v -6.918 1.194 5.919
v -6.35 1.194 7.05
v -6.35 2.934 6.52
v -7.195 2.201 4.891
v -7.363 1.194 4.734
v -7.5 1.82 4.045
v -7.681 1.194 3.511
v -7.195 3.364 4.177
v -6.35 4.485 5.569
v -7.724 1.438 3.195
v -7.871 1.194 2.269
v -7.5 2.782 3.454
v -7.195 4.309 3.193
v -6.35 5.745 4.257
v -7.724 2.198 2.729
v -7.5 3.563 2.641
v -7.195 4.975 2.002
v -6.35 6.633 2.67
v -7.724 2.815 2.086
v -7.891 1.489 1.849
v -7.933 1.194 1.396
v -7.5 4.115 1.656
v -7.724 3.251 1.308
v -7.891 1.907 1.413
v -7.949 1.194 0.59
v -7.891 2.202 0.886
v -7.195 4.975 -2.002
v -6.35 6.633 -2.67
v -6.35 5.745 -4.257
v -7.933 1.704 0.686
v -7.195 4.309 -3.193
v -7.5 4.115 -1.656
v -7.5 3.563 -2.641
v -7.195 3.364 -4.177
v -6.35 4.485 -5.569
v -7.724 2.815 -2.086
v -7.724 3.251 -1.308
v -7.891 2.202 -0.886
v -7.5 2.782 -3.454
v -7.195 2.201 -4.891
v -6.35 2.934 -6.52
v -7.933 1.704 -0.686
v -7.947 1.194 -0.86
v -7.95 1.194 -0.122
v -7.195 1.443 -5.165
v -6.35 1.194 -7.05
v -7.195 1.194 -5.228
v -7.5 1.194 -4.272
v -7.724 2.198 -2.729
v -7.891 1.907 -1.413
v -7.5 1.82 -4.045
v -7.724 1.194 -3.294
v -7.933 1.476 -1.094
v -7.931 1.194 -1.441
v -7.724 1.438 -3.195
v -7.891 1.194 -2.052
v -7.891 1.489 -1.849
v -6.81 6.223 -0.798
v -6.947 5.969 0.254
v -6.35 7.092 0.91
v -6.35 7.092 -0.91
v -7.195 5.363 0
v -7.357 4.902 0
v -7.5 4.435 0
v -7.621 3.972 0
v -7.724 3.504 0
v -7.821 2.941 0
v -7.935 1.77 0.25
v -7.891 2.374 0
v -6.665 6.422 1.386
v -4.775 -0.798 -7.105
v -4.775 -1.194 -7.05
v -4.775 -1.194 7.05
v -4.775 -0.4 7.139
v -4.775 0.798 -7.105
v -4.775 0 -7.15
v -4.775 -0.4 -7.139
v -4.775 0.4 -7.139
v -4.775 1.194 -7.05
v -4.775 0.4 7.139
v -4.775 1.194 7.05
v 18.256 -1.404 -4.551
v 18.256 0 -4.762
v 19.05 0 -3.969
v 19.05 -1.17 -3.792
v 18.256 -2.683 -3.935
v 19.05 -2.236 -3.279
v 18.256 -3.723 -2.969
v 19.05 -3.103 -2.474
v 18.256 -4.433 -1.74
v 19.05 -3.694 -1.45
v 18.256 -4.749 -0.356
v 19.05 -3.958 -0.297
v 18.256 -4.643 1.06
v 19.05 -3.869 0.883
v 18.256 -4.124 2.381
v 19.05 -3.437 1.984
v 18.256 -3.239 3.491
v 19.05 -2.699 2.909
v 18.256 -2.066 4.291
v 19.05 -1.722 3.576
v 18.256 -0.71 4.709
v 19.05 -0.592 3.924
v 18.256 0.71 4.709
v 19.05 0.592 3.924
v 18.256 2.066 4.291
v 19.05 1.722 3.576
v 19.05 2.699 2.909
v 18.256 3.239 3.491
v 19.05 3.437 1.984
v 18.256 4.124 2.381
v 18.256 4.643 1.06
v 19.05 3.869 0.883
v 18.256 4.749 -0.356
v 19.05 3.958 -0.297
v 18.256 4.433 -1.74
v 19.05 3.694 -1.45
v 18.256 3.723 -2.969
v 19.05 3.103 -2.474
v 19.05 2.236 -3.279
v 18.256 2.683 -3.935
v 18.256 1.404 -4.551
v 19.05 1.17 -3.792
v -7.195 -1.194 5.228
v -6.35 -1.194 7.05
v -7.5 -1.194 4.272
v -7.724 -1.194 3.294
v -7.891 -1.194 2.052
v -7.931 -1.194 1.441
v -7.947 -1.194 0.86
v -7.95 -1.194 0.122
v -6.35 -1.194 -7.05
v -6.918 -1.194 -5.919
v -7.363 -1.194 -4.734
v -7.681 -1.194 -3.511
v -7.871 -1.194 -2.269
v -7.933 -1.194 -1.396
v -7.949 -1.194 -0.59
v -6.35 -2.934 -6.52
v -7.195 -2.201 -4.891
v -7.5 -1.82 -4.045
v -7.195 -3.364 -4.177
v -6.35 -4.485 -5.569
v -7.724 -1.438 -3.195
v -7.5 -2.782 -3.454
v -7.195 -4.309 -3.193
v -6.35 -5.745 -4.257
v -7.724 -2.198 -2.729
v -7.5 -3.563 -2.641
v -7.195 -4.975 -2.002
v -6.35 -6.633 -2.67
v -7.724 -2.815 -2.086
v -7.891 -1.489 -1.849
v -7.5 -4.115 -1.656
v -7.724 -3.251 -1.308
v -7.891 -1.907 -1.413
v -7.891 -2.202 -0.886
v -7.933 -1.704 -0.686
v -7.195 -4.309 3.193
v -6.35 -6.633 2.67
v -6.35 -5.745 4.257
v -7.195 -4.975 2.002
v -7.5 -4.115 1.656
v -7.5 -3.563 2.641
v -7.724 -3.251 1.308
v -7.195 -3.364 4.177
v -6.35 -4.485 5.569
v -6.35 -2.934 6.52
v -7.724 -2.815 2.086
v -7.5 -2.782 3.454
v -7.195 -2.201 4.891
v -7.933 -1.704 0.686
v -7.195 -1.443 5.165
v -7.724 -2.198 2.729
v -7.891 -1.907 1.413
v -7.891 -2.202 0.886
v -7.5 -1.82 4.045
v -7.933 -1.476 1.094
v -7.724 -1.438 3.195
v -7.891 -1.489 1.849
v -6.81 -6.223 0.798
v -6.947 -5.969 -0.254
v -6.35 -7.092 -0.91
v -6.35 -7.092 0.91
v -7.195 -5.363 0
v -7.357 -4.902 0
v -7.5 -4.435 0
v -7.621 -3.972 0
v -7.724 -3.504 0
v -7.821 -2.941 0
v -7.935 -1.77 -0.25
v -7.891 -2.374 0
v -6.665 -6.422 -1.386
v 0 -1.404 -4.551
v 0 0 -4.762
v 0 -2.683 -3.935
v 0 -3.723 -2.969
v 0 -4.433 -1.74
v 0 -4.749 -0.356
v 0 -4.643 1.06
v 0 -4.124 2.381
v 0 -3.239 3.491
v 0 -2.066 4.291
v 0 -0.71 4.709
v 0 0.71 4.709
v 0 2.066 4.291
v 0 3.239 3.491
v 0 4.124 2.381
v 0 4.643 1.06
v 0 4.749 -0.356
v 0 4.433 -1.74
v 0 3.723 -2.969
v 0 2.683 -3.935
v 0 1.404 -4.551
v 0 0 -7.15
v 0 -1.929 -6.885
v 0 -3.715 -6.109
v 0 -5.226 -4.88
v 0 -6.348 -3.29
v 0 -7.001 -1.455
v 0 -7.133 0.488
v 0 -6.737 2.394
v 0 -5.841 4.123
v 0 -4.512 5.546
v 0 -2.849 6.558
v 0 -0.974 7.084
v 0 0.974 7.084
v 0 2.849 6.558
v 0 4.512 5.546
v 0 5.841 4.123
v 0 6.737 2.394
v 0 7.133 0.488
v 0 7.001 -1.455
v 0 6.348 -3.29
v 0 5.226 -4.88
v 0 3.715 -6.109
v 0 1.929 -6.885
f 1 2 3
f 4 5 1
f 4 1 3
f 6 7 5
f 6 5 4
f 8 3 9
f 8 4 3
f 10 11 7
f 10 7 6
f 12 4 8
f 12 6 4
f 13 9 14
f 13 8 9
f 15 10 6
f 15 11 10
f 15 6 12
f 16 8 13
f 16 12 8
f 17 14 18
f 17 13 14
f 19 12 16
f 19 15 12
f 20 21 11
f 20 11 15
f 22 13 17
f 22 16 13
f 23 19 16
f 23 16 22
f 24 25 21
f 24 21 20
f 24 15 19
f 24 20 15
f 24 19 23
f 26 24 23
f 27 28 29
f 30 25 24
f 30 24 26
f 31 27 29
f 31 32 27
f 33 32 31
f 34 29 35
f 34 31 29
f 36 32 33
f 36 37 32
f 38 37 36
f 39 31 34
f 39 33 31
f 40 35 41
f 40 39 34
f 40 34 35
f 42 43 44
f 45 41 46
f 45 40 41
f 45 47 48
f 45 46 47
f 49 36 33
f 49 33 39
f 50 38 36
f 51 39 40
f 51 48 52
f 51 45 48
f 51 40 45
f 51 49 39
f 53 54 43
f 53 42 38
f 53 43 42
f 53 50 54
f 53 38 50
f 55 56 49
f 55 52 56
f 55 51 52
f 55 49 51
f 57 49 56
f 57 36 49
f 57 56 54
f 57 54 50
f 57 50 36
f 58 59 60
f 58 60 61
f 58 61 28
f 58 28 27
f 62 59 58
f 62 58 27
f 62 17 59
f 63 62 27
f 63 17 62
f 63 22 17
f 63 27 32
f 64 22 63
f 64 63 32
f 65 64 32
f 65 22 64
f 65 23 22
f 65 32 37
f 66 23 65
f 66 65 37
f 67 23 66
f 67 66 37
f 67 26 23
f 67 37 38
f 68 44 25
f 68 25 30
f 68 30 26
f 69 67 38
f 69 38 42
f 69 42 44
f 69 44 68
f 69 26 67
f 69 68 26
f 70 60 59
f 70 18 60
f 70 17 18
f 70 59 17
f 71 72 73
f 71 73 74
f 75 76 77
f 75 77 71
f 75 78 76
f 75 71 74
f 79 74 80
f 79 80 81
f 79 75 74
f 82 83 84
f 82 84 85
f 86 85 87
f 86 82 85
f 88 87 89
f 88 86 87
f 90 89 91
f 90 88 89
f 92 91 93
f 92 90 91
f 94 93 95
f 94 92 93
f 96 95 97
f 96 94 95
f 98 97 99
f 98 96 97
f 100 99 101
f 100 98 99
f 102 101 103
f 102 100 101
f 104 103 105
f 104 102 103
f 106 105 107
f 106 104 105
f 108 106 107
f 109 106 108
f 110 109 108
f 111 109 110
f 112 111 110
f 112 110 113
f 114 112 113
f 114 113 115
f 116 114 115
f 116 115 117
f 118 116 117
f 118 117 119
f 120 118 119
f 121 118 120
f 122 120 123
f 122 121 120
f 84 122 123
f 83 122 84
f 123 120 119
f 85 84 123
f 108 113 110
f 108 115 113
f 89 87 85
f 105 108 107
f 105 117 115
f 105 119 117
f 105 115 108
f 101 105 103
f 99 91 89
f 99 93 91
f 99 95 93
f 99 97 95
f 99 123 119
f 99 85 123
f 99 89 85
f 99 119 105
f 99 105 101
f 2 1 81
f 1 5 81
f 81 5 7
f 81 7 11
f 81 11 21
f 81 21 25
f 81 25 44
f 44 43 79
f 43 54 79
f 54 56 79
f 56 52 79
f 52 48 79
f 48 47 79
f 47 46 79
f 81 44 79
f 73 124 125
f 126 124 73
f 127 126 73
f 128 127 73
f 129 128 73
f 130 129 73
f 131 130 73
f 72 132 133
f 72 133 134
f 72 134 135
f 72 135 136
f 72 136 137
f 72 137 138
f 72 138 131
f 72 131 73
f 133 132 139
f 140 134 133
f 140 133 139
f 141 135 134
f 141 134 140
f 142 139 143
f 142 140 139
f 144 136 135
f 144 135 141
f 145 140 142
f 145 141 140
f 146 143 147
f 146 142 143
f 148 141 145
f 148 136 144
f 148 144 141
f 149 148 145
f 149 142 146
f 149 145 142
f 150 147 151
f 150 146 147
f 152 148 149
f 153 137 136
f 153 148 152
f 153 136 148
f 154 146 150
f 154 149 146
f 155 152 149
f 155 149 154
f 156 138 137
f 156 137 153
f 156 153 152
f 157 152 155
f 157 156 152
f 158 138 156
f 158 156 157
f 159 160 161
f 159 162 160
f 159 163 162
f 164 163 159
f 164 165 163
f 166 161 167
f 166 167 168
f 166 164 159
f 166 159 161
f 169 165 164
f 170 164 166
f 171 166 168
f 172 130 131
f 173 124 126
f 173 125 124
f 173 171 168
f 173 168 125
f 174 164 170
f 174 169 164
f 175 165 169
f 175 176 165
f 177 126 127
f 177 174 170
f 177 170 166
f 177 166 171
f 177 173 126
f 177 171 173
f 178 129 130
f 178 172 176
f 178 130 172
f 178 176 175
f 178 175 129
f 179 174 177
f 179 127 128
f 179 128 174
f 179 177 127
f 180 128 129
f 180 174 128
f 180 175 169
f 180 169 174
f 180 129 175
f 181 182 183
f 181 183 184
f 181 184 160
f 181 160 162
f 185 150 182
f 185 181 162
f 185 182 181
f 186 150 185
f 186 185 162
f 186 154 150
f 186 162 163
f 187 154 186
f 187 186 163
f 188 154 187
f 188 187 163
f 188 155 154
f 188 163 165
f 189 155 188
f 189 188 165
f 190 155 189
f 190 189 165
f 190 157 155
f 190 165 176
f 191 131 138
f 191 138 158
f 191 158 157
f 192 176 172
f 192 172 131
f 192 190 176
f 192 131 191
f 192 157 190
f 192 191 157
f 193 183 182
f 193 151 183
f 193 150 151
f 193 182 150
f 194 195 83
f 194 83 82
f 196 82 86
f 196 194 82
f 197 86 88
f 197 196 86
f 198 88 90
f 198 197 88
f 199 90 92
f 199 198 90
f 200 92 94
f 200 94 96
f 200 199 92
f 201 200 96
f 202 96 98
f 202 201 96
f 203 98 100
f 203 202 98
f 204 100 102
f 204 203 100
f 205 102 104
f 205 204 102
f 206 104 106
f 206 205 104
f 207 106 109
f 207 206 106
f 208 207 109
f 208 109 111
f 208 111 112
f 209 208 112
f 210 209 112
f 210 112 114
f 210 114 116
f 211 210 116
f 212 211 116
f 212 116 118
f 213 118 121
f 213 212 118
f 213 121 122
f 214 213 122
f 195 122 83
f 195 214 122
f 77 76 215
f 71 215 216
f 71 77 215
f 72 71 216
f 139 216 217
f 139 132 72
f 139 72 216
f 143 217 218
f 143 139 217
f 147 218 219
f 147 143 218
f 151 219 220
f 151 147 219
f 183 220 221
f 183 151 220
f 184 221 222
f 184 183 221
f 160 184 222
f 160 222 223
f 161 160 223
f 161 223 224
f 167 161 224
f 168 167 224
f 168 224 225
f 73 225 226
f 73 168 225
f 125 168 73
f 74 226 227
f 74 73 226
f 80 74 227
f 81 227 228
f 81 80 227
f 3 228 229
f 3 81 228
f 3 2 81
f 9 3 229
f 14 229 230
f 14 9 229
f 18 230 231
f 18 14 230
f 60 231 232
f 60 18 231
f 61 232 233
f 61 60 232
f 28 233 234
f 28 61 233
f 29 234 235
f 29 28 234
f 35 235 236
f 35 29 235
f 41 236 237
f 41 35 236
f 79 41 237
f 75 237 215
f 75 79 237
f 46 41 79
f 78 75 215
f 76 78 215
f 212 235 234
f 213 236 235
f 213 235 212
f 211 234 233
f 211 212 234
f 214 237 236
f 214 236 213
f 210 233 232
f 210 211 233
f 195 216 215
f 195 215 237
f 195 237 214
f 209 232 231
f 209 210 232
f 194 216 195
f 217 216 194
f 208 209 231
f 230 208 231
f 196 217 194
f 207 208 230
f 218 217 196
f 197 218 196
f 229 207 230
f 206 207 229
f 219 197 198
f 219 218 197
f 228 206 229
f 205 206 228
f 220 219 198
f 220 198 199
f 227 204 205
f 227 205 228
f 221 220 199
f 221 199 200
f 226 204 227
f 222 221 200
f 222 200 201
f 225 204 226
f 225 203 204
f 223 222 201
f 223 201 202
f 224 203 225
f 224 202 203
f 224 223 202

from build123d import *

# Parameters (mm, degrees)
CUT_EXTRUDE1_DEPTH      = 22.567344827
CUT_EXTRUDE1_DEPTH_BACK = 22.567344827
SKETCH2_W               = 3.175
SKETCH2_H               = 2.3876
CHAMFER1_SIZE           = 0.79375


with BuildPart() as part:
    # Sketch1 → Revolve1 (revolve)
    with BuildSketch(Plane.XY, mode=Mode.PRIVATE) as revolve1_sk:
        with BuildLine():
            Line((-4.7752, 0), (19.05, 0))
            Line((19.05, 0), (19.05, 4.7625))
            Line((19.05, 4.7625), (0, 4.7625))
            Line((0, 4.7625), (0, 7.1501))
            Line((0, 7.1501), (-6.35, 7.1501))
            ThreePointArc((-6.35, 7.1501), (-7.543180771, 4.277553789), (-7.9502, 1.1938))
            Line((-7.9502, 1.1938), (-4.7752, 1.1938))
            Line((-4.7752, 1.1938), (-4.7752, 0))
        make_face()
    revolve(revolve1_sk.sketch.rotate(Axis((25.63827619, 0, 0), (-1, 0, 0)), 90), axis=Axis((25.63827619, 0, 0), (-1, 0, 0)))

    # Sketch2 → Cut-Extrude1 (cut, two sides: drawn at the far end of the back side and taken through both)
    with BuildSketch(Plane.XY.offset(-CUT_EXTRUDE1_DEPTH_BACK)):
        with Locations((-6.3627, 0)):
            Rectangle(SKETCH2_W, SKETCH2_H)
    extrude(amount=CUT_EXTRUDE1_DEPTH + CUT_EXTRUDE1_DEPTH_BACK, mode=Mode.SUBTRACT)

    # Chamfer1
    chamfer1_edges = [part.edges().sort_by_distance(p)[0] for p in [
        (19.05, 0, 4.7625),
    ]]
    chamfer(chamfer1_edges, length=CHAMFER1_SIZE)


solid = part.part
